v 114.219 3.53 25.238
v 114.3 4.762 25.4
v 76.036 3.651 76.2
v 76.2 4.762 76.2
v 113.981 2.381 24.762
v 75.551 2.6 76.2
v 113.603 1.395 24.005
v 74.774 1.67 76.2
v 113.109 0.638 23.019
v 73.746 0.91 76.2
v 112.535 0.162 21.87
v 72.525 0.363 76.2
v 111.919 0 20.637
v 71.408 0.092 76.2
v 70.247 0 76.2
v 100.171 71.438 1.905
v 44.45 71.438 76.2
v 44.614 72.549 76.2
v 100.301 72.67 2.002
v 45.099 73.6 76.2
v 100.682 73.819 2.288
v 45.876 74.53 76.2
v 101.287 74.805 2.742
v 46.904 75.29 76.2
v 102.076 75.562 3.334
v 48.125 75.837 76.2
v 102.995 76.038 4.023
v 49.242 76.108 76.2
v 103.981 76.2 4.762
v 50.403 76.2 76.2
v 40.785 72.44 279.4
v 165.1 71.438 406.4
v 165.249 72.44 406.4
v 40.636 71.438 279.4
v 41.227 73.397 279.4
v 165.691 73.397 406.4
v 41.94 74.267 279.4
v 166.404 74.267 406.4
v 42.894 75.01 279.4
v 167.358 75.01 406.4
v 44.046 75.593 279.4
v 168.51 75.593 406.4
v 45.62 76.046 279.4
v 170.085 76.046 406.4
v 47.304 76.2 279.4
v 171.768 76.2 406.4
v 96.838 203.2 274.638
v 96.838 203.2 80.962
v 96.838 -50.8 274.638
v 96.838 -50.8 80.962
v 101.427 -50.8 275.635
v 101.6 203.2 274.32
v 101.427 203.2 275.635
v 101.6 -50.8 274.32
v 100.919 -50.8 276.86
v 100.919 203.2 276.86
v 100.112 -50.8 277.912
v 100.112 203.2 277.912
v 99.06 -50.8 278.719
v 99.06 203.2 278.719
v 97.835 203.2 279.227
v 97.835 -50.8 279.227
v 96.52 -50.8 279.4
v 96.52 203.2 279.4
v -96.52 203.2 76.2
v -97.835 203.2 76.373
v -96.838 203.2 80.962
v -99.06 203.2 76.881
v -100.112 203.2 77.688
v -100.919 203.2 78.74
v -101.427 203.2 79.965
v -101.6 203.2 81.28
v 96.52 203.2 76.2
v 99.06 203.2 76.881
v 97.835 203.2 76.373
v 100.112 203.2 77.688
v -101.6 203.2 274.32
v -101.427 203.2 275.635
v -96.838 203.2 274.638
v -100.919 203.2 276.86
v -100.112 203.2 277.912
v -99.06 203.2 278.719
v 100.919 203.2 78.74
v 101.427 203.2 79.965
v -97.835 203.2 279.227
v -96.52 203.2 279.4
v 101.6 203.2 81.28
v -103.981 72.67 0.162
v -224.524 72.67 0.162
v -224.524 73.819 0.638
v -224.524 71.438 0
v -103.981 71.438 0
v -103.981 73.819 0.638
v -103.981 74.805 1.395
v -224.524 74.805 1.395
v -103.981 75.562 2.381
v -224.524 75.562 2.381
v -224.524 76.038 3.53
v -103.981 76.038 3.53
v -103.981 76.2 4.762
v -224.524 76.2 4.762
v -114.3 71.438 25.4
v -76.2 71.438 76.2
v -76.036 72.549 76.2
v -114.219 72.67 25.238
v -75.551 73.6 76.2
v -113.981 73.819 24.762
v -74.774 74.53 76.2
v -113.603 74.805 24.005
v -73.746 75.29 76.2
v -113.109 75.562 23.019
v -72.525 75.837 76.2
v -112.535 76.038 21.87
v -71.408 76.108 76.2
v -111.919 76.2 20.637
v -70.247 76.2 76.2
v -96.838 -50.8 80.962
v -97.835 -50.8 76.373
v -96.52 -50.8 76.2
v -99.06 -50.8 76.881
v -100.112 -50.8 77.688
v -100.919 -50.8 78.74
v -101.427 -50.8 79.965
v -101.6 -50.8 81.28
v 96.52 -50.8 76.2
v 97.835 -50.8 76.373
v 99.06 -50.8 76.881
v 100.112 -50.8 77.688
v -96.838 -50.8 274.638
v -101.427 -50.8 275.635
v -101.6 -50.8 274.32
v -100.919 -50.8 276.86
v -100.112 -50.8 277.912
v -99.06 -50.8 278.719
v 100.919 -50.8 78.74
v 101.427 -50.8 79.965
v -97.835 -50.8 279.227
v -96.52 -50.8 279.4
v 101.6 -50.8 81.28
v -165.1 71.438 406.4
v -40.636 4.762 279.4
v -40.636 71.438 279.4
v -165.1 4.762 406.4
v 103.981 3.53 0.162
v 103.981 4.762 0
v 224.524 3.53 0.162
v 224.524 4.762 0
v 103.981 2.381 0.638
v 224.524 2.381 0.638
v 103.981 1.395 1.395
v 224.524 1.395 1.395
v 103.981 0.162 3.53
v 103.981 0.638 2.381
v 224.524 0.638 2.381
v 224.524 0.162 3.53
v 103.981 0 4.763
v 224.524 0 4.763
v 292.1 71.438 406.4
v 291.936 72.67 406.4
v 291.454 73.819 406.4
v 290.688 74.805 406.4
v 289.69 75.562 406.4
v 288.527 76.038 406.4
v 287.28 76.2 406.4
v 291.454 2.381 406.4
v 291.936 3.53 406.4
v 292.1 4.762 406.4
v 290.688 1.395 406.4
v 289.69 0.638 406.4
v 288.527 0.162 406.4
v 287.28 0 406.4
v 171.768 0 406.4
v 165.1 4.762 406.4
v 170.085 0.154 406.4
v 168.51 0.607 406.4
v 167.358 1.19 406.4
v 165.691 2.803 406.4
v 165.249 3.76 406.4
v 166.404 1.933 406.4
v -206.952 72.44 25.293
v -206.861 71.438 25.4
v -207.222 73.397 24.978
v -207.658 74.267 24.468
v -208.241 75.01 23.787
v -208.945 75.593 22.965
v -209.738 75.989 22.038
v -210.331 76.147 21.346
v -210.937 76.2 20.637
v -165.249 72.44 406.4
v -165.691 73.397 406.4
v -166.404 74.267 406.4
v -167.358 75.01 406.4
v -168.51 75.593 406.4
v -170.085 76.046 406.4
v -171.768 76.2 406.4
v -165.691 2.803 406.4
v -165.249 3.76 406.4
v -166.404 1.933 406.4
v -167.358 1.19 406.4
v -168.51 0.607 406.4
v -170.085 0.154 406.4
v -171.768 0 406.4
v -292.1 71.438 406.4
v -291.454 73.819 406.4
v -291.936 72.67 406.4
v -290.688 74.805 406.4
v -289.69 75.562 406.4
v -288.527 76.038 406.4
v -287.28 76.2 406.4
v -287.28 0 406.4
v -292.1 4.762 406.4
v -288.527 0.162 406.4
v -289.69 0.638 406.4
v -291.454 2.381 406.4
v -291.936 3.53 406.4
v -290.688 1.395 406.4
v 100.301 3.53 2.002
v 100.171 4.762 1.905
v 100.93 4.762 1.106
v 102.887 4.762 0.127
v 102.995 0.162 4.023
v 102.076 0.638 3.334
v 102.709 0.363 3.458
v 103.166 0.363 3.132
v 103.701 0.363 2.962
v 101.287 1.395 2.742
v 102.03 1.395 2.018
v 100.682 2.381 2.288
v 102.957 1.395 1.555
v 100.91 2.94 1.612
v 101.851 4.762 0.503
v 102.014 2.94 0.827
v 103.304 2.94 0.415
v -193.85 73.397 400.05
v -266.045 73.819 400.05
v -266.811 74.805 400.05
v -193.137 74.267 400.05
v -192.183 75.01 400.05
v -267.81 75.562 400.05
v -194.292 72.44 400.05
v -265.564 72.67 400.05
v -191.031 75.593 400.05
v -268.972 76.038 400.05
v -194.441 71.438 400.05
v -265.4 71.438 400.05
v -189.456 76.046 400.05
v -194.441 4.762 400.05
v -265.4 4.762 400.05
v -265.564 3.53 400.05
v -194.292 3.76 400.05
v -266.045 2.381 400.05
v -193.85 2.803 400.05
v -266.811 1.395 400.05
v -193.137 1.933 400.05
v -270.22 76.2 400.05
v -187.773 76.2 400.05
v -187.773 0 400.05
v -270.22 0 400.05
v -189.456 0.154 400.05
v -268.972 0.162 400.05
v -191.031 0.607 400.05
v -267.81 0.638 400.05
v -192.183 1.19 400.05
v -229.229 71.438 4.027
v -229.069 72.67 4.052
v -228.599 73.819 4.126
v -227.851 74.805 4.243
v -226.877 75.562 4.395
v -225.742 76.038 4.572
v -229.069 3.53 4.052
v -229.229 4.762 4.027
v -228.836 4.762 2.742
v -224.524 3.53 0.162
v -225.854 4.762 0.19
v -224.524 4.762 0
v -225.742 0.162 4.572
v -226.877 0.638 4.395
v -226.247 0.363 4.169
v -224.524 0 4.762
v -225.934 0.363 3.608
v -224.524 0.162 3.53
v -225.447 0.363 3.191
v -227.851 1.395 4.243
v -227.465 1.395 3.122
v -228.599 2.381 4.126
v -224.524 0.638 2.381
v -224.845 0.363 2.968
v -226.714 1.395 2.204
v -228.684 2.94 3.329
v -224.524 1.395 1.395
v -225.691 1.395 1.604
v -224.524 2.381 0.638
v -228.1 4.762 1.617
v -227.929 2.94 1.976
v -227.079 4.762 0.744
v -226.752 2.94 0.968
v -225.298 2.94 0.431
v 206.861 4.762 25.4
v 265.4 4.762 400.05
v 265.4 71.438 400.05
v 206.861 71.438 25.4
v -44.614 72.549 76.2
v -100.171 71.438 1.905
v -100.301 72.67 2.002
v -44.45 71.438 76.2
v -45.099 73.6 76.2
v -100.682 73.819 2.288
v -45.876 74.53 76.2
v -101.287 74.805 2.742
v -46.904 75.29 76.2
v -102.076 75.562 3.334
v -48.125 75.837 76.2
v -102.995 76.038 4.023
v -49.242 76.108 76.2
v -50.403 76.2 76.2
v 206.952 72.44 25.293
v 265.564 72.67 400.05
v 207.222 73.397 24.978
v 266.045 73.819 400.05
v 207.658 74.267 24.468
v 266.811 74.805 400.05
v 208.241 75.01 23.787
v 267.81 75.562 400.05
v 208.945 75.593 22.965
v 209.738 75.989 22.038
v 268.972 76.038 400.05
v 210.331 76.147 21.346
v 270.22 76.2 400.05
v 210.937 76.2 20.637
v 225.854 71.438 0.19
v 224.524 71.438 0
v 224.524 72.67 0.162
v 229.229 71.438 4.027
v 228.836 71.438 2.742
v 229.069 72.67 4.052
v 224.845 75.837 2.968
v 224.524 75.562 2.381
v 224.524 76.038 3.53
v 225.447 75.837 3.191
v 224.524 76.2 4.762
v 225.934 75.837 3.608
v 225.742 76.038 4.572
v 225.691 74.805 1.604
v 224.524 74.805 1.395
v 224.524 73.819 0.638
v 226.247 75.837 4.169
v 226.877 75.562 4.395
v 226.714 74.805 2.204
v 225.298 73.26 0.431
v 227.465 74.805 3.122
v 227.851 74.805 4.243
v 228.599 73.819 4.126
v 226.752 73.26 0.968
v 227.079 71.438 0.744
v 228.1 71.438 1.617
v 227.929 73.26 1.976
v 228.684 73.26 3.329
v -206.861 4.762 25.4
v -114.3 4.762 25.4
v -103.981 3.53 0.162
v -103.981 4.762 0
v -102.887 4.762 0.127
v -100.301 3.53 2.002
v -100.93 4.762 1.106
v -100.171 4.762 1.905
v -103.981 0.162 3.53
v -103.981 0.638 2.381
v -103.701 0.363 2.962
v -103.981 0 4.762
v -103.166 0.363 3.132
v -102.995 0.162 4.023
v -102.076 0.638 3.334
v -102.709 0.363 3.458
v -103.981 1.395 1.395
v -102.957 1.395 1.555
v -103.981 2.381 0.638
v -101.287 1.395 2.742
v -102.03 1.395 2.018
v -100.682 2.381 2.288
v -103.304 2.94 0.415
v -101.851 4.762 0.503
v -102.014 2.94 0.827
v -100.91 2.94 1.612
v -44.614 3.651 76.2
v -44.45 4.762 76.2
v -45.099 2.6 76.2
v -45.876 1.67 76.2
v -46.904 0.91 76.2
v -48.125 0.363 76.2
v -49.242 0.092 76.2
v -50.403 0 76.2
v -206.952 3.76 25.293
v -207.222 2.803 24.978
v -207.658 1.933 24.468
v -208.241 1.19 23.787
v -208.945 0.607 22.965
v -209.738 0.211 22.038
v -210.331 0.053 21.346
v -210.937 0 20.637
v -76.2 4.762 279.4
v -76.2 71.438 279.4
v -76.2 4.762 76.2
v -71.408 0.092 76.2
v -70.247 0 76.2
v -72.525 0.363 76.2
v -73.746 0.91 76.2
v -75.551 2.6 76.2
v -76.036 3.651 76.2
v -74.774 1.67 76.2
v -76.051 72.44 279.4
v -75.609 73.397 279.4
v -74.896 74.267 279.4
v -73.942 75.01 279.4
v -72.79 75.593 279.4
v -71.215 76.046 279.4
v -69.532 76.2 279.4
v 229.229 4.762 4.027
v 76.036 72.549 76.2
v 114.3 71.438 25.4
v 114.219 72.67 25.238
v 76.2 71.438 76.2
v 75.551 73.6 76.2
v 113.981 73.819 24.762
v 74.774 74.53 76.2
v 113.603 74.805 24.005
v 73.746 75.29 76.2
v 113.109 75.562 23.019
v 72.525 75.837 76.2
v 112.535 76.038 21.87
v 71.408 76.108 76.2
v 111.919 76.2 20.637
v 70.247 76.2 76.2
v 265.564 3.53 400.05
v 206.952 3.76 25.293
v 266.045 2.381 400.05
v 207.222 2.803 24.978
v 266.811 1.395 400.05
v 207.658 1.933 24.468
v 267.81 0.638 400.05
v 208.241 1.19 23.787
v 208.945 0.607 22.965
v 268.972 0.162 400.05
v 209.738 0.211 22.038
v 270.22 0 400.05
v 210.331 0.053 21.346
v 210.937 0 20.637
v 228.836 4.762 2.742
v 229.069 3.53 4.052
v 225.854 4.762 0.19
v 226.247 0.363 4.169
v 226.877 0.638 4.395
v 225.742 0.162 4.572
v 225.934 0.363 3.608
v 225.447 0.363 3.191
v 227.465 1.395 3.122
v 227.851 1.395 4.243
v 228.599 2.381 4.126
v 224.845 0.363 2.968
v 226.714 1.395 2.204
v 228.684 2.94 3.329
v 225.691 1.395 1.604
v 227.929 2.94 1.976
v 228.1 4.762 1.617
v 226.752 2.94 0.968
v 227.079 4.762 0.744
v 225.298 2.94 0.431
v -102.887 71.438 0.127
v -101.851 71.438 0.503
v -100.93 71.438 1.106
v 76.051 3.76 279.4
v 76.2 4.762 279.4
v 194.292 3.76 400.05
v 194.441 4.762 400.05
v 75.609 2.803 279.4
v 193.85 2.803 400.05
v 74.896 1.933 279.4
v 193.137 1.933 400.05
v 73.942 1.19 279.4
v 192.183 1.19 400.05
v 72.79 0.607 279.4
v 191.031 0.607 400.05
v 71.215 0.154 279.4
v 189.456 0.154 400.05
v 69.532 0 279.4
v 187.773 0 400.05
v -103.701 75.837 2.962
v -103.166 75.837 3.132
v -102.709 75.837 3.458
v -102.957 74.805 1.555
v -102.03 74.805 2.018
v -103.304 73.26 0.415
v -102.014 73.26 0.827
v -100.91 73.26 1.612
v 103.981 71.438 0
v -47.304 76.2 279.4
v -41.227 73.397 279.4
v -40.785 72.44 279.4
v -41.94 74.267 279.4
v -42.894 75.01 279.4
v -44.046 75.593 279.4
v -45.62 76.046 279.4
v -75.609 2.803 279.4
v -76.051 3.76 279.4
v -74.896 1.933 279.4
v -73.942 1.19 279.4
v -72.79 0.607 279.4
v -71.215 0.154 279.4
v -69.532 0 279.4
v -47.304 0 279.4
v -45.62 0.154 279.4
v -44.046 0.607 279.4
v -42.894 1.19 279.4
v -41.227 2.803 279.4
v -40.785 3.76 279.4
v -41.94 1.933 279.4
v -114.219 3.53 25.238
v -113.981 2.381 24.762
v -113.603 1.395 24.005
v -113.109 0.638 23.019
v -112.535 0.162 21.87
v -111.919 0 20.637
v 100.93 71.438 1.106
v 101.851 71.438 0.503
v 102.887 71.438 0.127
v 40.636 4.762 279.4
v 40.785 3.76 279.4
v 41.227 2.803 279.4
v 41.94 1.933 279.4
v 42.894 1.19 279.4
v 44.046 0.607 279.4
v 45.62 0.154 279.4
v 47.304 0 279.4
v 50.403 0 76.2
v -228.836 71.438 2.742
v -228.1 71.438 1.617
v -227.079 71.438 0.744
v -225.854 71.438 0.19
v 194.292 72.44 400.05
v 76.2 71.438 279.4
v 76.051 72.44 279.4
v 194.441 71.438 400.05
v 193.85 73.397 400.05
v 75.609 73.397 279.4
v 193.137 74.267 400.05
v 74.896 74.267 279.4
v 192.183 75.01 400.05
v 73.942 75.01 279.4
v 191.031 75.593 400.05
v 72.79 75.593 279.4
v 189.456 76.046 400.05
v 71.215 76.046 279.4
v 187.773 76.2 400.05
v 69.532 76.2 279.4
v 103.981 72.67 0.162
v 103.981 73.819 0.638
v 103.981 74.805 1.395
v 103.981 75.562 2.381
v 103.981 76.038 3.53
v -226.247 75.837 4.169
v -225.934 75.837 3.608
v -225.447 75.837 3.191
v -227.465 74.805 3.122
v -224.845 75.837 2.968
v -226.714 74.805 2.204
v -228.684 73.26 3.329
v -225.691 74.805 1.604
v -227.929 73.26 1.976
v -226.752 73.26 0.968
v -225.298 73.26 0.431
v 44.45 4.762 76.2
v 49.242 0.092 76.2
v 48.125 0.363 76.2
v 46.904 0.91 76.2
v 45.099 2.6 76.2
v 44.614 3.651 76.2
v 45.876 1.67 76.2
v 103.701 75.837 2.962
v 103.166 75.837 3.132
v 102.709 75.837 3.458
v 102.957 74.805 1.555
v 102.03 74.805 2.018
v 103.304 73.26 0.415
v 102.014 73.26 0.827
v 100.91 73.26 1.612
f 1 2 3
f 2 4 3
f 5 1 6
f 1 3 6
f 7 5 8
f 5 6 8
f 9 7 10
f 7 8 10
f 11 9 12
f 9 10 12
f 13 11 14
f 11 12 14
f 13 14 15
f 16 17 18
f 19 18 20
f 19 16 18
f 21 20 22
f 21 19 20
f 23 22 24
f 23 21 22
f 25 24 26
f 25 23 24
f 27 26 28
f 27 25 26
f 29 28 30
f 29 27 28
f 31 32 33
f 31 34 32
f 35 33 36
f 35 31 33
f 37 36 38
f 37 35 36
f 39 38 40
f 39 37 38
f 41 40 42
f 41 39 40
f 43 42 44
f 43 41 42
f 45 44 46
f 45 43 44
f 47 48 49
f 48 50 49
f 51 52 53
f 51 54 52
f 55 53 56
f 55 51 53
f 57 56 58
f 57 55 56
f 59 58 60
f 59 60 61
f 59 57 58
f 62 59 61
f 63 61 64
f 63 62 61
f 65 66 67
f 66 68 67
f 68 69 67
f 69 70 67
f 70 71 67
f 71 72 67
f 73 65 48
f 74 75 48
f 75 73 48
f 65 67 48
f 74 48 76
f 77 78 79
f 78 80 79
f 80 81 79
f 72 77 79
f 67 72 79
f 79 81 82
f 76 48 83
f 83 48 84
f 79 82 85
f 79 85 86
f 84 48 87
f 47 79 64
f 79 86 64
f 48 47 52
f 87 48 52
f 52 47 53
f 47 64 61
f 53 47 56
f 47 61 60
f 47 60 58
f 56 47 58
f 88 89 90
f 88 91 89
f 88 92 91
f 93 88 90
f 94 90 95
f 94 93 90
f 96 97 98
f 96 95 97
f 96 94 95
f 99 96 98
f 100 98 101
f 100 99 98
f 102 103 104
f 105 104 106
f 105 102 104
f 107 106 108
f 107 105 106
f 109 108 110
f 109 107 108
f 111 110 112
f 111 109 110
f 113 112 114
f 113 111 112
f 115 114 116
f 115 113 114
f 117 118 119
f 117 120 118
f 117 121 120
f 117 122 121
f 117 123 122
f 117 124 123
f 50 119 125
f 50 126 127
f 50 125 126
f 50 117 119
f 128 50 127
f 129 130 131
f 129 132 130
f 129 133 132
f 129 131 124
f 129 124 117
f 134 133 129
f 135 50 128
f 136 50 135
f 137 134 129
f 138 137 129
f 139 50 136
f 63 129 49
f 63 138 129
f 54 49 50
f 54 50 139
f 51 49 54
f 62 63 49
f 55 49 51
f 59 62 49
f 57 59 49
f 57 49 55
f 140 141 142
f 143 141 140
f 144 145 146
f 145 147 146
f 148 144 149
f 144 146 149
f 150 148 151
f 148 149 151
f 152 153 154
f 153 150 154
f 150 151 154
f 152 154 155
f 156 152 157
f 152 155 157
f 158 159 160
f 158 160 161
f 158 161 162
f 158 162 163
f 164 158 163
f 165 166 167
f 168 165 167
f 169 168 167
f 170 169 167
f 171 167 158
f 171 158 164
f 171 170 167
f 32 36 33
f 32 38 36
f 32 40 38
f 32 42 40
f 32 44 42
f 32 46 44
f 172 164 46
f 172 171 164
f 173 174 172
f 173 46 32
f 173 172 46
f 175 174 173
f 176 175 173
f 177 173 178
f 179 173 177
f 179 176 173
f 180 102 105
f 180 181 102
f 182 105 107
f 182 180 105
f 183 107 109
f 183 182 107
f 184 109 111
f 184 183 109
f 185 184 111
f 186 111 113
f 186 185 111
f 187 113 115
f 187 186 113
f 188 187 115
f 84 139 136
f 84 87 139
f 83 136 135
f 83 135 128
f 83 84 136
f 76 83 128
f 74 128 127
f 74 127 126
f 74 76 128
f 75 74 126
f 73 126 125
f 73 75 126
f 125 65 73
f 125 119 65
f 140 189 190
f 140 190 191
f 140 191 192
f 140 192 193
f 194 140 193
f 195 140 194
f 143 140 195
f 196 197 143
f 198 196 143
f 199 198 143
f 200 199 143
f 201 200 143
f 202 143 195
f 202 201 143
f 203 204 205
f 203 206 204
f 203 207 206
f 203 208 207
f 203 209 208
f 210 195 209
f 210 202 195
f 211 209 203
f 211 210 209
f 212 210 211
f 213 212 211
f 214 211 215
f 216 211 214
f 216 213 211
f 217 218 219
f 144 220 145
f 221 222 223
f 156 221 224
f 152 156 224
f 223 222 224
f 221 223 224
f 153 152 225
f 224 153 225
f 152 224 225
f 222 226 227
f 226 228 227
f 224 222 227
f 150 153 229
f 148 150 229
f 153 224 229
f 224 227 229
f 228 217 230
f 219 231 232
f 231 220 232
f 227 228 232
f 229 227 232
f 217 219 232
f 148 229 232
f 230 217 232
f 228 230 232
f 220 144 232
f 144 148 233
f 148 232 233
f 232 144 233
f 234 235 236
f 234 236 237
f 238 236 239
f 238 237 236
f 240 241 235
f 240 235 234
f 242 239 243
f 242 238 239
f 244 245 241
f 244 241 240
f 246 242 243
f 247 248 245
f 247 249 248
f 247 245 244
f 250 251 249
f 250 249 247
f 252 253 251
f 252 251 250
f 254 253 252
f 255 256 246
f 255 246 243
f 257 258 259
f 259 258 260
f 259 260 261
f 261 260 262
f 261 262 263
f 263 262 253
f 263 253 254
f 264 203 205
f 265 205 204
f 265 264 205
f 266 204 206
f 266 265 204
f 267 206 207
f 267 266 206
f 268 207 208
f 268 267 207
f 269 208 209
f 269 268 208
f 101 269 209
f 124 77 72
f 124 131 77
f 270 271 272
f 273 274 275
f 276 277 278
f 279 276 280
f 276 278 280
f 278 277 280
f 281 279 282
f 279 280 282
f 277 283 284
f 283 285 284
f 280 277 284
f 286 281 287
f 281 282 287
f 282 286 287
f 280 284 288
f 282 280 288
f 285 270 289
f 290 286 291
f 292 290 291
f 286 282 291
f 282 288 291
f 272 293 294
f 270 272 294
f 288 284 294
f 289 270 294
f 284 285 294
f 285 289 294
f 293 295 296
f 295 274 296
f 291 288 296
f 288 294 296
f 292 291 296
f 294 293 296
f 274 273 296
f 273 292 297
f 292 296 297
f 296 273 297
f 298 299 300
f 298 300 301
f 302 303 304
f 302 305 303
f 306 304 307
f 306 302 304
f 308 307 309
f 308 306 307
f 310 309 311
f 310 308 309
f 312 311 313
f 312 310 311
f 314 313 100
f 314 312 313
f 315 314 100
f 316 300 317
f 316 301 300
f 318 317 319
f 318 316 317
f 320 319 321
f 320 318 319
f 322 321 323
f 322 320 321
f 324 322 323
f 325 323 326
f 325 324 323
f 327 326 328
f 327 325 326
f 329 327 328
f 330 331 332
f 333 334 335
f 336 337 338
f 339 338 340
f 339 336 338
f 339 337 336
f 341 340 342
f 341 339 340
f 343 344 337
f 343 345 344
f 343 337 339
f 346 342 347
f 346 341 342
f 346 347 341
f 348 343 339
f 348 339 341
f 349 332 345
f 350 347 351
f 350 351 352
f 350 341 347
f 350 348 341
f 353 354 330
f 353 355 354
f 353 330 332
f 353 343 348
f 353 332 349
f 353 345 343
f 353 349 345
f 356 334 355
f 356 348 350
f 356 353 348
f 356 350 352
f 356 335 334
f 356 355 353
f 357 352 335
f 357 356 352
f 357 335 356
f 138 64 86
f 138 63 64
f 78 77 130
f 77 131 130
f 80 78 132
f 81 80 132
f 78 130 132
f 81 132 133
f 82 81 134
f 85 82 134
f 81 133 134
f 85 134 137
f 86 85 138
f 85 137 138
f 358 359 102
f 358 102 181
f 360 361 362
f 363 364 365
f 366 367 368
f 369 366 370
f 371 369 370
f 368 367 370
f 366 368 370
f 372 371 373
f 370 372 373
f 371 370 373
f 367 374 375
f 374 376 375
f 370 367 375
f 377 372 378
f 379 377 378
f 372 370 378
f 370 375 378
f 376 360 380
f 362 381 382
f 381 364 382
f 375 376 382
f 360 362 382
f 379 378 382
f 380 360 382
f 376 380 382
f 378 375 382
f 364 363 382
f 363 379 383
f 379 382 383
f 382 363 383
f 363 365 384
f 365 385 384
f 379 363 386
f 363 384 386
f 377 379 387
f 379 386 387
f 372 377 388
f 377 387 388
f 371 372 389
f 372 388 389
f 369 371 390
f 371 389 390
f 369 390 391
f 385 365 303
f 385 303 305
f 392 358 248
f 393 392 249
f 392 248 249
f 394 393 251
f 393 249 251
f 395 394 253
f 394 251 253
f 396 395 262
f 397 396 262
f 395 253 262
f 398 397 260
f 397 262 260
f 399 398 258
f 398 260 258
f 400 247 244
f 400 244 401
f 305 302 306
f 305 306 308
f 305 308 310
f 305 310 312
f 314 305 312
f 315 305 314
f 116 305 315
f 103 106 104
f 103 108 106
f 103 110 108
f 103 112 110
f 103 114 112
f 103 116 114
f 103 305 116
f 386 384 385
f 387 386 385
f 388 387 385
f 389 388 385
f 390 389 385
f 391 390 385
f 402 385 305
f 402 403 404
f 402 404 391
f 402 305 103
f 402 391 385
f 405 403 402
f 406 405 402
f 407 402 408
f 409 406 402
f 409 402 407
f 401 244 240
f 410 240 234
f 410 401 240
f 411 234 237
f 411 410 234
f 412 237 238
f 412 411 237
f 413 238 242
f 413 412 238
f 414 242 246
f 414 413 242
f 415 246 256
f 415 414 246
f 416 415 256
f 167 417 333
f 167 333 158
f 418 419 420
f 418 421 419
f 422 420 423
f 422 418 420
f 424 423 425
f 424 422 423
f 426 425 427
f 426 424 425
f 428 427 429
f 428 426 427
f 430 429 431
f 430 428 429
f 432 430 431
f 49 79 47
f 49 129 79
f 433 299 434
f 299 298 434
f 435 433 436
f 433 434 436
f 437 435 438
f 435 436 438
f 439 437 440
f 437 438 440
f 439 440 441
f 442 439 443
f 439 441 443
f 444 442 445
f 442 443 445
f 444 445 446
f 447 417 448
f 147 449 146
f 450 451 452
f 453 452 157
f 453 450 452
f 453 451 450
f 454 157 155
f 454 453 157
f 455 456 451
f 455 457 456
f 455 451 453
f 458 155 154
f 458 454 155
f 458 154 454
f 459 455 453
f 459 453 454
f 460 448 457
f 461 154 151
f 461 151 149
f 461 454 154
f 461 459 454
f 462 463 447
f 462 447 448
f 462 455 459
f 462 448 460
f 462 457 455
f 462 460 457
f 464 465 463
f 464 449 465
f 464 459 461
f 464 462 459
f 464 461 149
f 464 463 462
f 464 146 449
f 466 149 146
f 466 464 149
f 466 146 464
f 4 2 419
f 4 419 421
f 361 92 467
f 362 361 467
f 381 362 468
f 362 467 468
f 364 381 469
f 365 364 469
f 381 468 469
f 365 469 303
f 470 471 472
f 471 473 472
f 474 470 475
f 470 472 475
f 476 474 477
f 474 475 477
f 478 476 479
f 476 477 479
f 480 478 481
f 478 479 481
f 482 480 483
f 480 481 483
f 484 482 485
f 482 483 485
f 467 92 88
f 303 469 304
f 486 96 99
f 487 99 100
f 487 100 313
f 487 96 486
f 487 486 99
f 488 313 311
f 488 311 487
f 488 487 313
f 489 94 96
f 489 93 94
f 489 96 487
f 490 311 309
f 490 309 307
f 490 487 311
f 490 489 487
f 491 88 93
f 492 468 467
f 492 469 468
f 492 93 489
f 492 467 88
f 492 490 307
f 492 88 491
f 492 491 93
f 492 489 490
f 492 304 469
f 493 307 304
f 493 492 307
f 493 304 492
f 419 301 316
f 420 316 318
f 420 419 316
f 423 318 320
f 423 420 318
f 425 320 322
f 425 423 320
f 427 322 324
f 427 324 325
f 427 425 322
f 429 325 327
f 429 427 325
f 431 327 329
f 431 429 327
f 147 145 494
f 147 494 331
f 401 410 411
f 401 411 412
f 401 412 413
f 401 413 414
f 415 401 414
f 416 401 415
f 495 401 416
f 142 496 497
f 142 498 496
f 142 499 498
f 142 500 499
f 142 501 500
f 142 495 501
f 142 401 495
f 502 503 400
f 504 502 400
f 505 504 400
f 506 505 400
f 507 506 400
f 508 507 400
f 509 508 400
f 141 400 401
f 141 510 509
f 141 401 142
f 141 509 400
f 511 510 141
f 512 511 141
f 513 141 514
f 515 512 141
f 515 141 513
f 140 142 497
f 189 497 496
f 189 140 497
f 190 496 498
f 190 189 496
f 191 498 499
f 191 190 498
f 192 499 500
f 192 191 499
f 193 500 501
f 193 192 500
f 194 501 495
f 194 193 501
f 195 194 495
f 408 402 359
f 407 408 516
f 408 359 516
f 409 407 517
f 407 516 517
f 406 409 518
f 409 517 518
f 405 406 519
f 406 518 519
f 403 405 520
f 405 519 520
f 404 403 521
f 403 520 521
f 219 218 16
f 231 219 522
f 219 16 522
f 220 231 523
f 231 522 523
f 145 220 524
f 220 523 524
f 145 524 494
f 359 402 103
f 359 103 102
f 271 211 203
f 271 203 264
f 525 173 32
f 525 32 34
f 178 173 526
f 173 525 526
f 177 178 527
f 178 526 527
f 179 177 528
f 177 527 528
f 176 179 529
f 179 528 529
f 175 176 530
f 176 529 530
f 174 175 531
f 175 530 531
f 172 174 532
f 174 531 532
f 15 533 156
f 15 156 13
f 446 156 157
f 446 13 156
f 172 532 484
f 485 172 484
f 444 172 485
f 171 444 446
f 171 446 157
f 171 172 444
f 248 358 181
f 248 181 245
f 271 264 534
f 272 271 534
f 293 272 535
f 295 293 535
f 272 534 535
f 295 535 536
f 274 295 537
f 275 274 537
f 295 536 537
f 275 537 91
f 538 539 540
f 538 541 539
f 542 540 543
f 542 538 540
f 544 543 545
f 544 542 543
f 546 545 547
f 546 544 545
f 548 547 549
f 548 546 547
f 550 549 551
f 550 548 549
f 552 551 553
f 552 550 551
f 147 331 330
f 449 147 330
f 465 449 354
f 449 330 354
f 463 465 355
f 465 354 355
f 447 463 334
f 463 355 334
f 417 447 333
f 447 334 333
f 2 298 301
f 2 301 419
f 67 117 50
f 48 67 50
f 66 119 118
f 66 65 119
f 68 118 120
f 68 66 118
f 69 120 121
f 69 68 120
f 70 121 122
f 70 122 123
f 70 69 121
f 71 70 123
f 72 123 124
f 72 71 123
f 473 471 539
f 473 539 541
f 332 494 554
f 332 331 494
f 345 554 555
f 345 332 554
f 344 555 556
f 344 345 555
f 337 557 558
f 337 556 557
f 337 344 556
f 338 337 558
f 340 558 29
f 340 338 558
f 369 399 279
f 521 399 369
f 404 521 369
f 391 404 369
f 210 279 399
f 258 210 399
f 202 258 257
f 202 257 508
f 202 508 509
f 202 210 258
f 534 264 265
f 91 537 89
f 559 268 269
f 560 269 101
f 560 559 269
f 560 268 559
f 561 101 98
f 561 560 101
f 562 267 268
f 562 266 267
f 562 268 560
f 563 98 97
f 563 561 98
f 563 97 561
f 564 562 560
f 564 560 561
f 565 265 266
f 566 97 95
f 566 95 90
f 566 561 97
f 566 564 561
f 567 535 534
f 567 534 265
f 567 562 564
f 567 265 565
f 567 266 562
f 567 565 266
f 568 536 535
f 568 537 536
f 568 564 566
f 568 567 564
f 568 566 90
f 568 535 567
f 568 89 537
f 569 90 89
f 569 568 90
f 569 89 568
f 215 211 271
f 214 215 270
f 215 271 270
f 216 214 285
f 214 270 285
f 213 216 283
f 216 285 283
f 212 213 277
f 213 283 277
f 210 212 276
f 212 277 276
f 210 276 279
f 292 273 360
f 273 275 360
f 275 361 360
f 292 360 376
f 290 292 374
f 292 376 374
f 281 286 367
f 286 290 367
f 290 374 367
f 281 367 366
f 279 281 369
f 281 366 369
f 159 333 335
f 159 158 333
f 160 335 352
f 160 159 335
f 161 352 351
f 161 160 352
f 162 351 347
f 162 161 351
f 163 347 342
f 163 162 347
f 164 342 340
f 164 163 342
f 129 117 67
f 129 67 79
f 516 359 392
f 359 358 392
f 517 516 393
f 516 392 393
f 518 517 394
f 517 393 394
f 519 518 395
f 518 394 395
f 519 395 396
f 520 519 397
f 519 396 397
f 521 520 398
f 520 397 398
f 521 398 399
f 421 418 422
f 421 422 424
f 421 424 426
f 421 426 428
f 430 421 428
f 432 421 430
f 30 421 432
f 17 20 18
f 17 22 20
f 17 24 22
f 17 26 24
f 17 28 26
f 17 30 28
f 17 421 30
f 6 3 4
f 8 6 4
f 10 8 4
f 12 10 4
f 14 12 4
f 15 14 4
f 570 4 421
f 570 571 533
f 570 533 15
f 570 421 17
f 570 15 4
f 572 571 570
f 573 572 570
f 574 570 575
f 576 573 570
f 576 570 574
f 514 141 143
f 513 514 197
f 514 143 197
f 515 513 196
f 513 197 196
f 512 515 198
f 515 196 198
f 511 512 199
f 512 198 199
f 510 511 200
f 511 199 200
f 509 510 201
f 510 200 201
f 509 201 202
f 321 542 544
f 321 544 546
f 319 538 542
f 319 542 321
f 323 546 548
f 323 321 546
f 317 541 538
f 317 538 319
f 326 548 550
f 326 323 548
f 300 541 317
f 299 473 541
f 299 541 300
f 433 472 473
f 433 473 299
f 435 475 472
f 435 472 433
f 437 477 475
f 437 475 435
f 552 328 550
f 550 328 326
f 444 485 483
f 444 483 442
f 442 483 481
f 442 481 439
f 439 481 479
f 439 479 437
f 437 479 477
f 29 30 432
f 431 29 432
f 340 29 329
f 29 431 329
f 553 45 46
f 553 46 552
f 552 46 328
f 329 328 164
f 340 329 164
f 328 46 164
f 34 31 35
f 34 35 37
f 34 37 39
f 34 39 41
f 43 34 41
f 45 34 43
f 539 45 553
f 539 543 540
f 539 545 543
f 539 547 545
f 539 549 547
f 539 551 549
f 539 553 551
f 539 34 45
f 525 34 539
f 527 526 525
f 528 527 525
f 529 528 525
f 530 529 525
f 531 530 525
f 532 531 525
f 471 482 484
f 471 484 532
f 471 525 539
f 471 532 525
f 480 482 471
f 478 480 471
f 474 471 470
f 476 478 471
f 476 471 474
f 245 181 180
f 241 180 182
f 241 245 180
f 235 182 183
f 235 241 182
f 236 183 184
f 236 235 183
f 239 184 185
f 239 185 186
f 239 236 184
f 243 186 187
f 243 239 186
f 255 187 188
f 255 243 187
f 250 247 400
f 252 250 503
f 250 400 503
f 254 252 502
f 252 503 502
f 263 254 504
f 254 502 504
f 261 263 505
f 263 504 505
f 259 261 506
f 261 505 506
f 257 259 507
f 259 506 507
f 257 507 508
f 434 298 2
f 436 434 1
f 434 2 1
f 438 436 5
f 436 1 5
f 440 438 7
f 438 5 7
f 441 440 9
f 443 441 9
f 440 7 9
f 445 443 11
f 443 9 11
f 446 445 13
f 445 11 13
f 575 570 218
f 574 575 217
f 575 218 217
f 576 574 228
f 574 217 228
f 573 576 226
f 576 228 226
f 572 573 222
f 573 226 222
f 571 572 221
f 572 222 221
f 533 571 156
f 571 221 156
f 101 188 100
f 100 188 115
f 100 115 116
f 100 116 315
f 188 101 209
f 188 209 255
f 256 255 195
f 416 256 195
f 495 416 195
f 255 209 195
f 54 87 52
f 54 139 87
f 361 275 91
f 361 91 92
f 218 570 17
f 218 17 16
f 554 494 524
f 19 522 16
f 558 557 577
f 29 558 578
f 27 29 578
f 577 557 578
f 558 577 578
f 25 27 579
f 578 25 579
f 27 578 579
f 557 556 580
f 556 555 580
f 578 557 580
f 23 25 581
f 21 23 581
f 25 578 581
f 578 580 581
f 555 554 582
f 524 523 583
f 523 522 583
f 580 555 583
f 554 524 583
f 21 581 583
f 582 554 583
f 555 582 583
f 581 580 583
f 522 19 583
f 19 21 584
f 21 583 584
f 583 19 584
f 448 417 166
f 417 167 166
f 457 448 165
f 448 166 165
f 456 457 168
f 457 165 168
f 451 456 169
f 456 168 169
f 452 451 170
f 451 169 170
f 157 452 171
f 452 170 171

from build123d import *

# Parameters (mm, degrees)
F1_DEPTH      = 76.2
F0_W          = 193.675
F0_H          = 193.675
F2_DEPTH      = 50.8
F2_DEPTH_BACK = 203.2
F3_R          = 5.08
F4_R          = 4.7625


with BuildPart() as f1:
    # F0 (on Front) → F1 (new body)
    with BuildSketch(Plane.XZ):
        Polygon((-165.1, 406.4), (-200.664219, 406.4), (-194.441008, 400.05), (-76.2, 279.4), (-40.635781, 279.4), align=None)
        Polygon((-200.664219, 406.4), (-266.391811, 406.4), (-265.399624, 400.05), (-194.441008, 400.05), align=None)
        Polygon((-292.1, 406.4), (-228.6, 0), (-101.6, 0), (-44.45, 76.2), (-76.2, 76.2), (-114.3, 25.4), (-206.860561, 25.4), (-265.399624, 400.05), (-266.391811, 406.4), align=None)
        Polygon((165.1, 406.4), (40.635781, 279.4), (76.2, 279.4), (194.441008, 400.05), (200.664219, 406.4), align=None)
        Polygon((76.2, 76.2), (44.45, 76.2), (101.6, 0), (228.6, 0), (292.1, 406.4), (266.391811, 406.4), (265.399624, 400.05), (206.860561, 25.4), (114.3, 25.4), align=None)
        Polygon((265.399624, 400.05), (266.391811, 406.4), (200.664219, 406.4), (194.441008, 400.05), align=None)
    extrude(amount=-F1_DEPTH)

    # F4
    f4_edges = [f1.edges().sort_by_distance(p)[0] for p in [
        (-102.867891, 76.2, 342.9),
        (-102.867891, 0, 342.9),
        (-135.320504, 0, 339.725),
        (-236.130092, 0, 212.725),
        (-260.35, 0, 203.2),
        (-236.130092, 76.2, 212.725),
        (-160.580281, 0, 25.4),
        (-165.1, 0, 0),
        (102.867891, 0, 342.9),
        (102.867891, 76.2, 342.9),
        (135.320504, 0, 339.725),
        (236.130092, 0, 212.725),
        (260.35, 0, 203.2),
        (260.35, 76.2, 203.2),
        (95.25, 0, 50.8),
        (73.025, 0, 38.1),
        (95.25, 76.2, 50.8),
        (160.580281, 76.2, 25.4),
        (160.580281, 0, 25.4),
        (165.1, 0, 0),
        (228.6, 38.1, 0),
        (-228.6, 38.1, 0),
        (-260.35, 76.2, 203.2),
        (-165.1, 76.2, 0),
        (-160.580281, 76.2, 25.4),
        (-95.25, 0, 50.8),
        (-95.25, 76.2, 50.8),
        (-73.025, 76.2, 38.1),
        (165.1, 76.2, 0),
        (236.130092, 76.2, 212.725),
        (135.320504, 76.2, 339.725),
        (-135.320504, 76.2, 339.725),
        (73.025, 76.2, 38.1),
        (101.6, 38.1, 0),
        (-73.025, 0, 38.1),
        (-101.6, 38.1, 0),
    ]]
    fillet(f4_edges, radius=F4_R)


with BuildPart() as f2:
    # F0 (on Front) → F2 (new body, two sides)
    with BuildSketch(Plane.XZ) as f2_sk:
        Polygon((-76.2, 76.2), (-44.45, 76.2), (44.45, 76.2), (76.2, 76.2), (101.6, 76.2), (101.6, 279.4), (76.2, 279.4), (40.635781, 279.4), (-40.635781, 279.4), (-76.2, 279.4), (-101.6, 279.4), (-101.6, 76.2), align=None)
        with Locations((0, 177.8)):
            Rectangle(F0_W, F0_H, mode=Mode.SUBTRACT)
    extrude(amount=F2_DEPTH)
    extrude(f2_sk.sketch, amount=-F2_DEPTH_BACK)

    # F3
    f3_edges = [f2.edges().sort_by_distance(p)[0] for p in [
        (-101.6, 76.2, 279.4),
        (101.6, 76.2, 279.4),
        (101.6, 76.2, 76.2),
        (-101.6, 76.2, 76.2),
    ]]
    fillet(f3_edges, radius=F3_R)


solid = Compound([f1.part, f2.part])
